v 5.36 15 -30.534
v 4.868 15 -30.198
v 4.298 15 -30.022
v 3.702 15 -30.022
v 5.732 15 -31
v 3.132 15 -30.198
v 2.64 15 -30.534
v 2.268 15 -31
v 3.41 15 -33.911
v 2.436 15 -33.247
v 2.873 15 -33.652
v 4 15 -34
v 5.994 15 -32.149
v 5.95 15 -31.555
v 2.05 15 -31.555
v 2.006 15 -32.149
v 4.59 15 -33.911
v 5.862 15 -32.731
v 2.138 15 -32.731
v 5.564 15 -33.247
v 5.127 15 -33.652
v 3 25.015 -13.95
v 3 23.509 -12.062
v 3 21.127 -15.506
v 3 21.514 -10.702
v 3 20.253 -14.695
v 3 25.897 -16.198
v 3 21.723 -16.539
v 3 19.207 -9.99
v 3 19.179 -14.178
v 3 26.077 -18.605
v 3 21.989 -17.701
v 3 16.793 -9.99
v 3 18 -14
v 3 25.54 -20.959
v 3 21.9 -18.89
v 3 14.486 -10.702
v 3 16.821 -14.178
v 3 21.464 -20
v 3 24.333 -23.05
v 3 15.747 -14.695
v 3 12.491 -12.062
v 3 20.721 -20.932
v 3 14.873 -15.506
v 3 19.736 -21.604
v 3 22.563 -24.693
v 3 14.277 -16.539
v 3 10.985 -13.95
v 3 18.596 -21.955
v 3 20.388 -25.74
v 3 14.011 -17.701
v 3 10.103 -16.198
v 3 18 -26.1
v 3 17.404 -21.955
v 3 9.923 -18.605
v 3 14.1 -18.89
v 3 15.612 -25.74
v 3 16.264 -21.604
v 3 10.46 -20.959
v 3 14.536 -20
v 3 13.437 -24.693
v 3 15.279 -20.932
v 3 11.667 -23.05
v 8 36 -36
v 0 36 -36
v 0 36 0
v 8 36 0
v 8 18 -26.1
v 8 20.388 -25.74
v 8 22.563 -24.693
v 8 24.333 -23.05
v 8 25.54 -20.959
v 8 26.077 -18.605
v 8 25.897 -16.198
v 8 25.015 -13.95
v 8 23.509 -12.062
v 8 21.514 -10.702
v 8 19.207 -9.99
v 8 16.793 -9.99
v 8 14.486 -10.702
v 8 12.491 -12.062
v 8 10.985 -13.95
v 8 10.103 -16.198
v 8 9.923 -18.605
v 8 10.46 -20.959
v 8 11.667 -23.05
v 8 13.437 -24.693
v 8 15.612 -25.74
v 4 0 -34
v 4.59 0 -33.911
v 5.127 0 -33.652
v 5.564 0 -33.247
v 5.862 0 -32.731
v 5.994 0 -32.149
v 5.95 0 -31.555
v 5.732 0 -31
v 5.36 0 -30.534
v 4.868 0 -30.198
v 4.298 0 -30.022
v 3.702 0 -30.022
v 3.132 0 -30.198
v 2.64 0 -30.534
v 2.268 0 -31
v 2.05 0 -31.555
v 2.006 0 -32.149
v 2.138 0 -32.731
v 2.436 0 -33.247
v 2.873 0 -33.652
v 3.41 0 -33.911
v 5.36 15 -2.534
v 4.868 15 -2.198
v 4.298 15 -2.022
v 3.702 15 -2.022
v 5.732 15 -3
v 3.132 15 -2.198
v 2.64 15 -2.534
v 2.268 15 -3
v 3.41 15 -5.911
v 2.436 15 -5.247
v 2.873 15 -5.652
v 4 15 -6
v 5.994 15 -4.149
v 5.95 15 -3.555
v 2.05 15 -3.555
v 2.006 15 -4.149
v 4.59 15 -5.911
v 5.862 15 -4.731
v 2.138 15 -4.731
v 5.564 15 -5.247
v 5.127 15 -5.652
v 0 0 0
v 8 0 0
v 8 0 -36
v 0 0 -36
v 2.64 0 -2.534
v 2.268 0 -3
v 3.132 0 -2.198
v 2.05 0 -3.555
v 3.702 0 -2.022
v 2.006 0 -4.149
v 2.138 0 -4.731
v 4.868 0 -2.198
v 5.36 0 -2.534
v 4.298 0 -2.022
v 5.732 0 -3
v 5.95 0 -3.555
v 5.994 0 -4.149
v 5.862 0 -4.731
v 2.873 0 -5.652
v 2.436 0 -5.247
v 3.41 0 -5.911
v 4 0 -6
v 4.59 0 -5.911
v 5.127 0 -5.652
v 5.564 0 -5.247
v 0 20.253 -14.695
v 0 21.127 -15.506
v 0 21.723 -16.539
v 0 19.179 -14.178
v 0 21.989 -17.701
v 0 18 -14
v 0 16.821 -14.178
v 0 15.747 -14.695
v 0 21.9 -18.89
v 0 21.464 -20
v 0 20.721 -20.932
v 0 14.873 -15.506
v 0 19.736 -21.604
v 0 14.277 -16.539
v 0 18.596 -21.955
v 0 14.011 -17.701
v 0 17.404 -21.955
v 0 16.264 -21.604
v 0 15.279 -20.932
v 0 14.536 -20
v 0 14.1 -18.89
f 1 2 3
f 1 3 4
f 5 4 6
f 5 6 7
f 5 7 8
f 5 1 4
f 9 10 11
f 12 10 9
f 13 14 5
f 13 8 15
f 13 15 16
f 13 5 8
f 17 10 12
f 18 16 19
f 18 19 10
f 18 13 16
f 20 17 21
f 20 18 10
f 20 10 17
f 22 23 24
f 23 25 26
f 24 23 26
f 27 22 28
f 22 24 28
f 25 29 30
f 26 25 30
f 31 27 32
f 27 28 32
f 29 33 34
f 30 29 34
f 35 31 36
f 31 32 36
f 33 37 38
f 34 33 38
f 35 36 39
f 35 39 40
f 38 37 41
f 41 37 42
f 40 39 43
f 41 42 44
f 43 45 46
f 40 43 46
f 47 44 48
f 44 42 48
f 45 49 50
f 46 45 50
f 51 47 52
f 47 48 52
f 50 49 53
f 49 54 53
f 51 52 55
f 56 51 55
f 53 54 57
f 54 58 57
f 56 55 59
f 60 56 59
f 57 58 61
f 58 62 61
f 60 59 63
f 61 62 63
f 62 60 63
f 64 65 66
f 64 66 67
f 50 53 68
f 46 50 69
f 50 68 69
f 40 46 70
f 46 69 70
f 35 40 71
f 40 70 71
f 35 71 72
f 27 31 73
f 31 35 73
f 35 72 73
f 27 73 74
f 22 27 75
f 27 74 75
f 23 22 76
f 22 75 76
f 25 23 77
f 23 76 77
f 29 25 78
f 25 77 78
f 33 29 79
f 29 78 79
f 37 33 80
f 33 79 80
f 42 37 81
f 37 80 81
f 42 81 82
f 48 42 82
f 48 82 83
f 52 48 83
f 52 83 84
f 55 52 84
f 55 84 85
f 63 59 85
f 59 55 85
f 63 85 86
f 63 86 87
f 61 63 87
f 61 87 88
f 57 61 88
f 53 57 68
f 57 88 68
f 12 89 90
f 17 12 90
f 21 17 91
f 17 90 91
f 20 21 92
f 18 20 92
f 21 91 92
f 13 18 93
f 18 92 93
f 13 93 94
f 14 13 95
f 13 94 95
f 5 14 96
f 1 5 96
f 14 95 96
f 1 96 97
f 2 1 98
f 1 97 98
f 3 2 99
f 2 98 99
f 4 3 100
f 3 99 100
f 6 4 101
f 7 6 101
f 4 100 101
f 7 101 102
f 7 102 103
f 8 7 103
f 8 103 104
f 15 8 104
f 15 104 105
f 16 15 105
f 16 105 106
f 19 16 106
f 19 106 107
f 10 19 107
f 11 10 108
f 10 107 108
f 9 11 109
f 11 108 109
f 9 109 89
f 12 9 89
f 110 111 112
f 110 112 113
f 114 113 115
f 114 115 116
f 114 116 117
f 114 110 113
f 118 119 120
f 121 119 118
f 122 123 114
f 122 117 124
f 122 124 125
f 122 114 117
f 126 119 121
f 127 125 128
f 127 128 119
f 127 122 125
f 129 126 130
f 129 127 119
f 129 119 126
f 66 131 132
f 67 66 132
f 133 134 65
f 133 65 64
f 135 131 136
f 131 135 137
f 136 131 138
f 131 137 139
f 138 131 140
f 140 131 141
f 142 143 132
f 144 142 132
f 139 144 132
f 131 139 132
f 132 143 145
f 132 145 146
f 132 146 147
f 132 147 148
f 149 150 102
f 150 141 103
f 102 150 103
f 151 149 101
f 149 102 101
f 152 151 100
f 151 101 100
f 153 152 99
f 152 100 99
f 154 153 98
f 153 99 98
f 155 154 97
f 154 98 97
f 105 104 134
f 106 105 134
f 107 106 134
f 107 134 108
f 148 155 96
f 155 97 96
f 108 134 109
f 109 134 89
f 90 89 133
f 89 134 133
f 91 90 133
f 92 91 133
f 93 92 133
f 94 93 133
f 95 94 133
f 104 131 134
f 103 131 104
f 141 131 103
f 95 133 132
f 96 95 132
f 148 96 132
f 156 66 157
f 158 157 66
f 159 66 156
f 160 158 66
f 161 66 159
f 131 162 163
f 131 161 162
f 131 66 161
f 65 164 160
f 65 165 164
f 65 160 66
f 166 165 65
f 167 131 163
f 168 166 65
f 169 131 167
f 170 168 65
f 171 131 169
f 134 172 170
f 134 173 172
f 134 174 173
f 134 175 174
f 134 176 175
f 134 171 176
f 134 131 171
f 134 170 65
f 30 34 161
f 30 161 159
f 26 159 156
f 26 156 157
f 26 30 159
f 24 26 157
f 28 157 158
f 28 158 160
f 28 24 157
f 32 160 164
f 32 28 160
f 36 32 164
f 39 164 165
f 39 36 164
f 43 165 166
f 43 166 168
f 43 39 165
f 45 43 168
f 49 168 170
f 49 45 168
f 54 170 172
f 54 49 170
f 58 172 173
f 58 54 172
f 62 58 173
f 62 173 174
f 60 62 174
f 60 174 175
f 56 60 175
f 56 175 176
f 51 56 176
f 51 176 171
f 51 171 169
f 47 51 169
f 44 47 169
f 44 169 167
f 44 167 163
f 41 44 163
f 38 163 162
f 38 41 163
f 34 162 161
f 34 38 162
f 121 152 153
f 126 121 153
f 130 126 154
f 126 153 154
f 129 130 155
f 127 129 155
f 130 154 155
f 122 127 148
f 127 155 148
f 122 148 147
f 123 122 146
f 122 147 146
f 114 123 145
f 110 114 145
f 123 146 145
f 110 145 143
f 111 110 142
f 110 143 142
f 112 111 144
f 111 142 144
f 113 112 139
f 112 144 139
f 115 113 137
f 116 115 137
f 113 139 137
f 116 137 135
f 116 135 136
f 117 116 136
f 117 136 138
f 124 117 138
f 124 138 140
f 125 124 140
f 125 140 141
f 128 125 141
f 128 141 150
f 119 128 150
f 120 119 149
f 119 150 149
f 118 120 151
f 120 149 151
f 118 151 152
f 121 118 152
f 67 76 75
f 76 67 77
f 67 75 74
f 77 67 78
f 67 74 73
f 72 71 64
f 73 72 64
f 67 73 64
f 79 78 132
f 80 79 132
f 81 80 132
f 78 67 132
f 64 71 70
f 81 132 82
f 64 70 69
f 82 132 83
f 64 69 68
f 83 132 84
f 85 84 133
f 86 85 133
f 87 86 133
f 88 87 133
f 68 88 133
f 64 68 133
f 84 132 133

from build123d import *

# Parameters (mm, degrees)
ESQUISSE1_W             = 8
ESQUISSE1_H             = 36
BOSS_EXTRU_3_DEPTH      = 36
ESQUISSE9_R             = 8.1
ENL_V_MAT_EXTRU_1_DEPTH = 10
BOSS_EXTRU_4_START      = -3
ESQUISSE10_R            = 8.1
ESQUISSE10_R_2          = 4
BOSS_EXTRU_4_DEPTH      = 3
ESQUISSE13_R            = 2
ENL_V_MAT_EXTRU_2_DEPTH = 15


with BuildPart() as part:
    # Esquisse1 → Boss.-Extru.3 (new body)
    with BuildSketch(Plane(origin=(0, 0, 0), x_dir=(1, 0, 0), z_dir=(0, 1, 0))):
        with Locations((4, 18)):
            Rectangle(ESQUISSE1_W, ESQUISSE1_H)
    extrude(amount=BOSS_EXTRU_3_DEPTH)

    # Esquisse9 → Enlèv. mat.-Extru.1 (cut)
    with BuildSketch(Plane(origin=(8, 0, 0), x_dir=(0, 0, -1), z_dir=(1, 0, 0))):
        with Locations((18, 18)):
            Circle(ESQUISSE9_R)
    extrude(amount=-ENL_V_MAT_EXTRU_1_DEPTH, mode=Mode.SUBTRACT)

    # Esquisse10 → Boss.-Extru.4 (add)
    with BuildSketch(Plane.ZY.offset(BOSS_EXTRU_4_START)):
        with Locations((-18, 18)):
            Circle(ESQUISSE10_R)
        with Locations((-18, 18)):
            Circle(ESQUISSE10_R_2, mode=Mode.SUBTRACT)
    extrude(amount=BOSS_EXTRU_4_DEPTH)

    # Esquisse13 → Enlèv. mat.-Extru.2 (cut)
    with BuildSketch(Plane.XZ):
        with Locations((4, -4)):
            Circle(ESQUISSE13_R)
        with Locations((4, -32)):
            Circle(ESQUISSE13_R)
    extrude(amount=-ENL_V_MAT_EXTRU_2_DEPTH, mode=Mode.SUBTRACT)


solid = part.part
